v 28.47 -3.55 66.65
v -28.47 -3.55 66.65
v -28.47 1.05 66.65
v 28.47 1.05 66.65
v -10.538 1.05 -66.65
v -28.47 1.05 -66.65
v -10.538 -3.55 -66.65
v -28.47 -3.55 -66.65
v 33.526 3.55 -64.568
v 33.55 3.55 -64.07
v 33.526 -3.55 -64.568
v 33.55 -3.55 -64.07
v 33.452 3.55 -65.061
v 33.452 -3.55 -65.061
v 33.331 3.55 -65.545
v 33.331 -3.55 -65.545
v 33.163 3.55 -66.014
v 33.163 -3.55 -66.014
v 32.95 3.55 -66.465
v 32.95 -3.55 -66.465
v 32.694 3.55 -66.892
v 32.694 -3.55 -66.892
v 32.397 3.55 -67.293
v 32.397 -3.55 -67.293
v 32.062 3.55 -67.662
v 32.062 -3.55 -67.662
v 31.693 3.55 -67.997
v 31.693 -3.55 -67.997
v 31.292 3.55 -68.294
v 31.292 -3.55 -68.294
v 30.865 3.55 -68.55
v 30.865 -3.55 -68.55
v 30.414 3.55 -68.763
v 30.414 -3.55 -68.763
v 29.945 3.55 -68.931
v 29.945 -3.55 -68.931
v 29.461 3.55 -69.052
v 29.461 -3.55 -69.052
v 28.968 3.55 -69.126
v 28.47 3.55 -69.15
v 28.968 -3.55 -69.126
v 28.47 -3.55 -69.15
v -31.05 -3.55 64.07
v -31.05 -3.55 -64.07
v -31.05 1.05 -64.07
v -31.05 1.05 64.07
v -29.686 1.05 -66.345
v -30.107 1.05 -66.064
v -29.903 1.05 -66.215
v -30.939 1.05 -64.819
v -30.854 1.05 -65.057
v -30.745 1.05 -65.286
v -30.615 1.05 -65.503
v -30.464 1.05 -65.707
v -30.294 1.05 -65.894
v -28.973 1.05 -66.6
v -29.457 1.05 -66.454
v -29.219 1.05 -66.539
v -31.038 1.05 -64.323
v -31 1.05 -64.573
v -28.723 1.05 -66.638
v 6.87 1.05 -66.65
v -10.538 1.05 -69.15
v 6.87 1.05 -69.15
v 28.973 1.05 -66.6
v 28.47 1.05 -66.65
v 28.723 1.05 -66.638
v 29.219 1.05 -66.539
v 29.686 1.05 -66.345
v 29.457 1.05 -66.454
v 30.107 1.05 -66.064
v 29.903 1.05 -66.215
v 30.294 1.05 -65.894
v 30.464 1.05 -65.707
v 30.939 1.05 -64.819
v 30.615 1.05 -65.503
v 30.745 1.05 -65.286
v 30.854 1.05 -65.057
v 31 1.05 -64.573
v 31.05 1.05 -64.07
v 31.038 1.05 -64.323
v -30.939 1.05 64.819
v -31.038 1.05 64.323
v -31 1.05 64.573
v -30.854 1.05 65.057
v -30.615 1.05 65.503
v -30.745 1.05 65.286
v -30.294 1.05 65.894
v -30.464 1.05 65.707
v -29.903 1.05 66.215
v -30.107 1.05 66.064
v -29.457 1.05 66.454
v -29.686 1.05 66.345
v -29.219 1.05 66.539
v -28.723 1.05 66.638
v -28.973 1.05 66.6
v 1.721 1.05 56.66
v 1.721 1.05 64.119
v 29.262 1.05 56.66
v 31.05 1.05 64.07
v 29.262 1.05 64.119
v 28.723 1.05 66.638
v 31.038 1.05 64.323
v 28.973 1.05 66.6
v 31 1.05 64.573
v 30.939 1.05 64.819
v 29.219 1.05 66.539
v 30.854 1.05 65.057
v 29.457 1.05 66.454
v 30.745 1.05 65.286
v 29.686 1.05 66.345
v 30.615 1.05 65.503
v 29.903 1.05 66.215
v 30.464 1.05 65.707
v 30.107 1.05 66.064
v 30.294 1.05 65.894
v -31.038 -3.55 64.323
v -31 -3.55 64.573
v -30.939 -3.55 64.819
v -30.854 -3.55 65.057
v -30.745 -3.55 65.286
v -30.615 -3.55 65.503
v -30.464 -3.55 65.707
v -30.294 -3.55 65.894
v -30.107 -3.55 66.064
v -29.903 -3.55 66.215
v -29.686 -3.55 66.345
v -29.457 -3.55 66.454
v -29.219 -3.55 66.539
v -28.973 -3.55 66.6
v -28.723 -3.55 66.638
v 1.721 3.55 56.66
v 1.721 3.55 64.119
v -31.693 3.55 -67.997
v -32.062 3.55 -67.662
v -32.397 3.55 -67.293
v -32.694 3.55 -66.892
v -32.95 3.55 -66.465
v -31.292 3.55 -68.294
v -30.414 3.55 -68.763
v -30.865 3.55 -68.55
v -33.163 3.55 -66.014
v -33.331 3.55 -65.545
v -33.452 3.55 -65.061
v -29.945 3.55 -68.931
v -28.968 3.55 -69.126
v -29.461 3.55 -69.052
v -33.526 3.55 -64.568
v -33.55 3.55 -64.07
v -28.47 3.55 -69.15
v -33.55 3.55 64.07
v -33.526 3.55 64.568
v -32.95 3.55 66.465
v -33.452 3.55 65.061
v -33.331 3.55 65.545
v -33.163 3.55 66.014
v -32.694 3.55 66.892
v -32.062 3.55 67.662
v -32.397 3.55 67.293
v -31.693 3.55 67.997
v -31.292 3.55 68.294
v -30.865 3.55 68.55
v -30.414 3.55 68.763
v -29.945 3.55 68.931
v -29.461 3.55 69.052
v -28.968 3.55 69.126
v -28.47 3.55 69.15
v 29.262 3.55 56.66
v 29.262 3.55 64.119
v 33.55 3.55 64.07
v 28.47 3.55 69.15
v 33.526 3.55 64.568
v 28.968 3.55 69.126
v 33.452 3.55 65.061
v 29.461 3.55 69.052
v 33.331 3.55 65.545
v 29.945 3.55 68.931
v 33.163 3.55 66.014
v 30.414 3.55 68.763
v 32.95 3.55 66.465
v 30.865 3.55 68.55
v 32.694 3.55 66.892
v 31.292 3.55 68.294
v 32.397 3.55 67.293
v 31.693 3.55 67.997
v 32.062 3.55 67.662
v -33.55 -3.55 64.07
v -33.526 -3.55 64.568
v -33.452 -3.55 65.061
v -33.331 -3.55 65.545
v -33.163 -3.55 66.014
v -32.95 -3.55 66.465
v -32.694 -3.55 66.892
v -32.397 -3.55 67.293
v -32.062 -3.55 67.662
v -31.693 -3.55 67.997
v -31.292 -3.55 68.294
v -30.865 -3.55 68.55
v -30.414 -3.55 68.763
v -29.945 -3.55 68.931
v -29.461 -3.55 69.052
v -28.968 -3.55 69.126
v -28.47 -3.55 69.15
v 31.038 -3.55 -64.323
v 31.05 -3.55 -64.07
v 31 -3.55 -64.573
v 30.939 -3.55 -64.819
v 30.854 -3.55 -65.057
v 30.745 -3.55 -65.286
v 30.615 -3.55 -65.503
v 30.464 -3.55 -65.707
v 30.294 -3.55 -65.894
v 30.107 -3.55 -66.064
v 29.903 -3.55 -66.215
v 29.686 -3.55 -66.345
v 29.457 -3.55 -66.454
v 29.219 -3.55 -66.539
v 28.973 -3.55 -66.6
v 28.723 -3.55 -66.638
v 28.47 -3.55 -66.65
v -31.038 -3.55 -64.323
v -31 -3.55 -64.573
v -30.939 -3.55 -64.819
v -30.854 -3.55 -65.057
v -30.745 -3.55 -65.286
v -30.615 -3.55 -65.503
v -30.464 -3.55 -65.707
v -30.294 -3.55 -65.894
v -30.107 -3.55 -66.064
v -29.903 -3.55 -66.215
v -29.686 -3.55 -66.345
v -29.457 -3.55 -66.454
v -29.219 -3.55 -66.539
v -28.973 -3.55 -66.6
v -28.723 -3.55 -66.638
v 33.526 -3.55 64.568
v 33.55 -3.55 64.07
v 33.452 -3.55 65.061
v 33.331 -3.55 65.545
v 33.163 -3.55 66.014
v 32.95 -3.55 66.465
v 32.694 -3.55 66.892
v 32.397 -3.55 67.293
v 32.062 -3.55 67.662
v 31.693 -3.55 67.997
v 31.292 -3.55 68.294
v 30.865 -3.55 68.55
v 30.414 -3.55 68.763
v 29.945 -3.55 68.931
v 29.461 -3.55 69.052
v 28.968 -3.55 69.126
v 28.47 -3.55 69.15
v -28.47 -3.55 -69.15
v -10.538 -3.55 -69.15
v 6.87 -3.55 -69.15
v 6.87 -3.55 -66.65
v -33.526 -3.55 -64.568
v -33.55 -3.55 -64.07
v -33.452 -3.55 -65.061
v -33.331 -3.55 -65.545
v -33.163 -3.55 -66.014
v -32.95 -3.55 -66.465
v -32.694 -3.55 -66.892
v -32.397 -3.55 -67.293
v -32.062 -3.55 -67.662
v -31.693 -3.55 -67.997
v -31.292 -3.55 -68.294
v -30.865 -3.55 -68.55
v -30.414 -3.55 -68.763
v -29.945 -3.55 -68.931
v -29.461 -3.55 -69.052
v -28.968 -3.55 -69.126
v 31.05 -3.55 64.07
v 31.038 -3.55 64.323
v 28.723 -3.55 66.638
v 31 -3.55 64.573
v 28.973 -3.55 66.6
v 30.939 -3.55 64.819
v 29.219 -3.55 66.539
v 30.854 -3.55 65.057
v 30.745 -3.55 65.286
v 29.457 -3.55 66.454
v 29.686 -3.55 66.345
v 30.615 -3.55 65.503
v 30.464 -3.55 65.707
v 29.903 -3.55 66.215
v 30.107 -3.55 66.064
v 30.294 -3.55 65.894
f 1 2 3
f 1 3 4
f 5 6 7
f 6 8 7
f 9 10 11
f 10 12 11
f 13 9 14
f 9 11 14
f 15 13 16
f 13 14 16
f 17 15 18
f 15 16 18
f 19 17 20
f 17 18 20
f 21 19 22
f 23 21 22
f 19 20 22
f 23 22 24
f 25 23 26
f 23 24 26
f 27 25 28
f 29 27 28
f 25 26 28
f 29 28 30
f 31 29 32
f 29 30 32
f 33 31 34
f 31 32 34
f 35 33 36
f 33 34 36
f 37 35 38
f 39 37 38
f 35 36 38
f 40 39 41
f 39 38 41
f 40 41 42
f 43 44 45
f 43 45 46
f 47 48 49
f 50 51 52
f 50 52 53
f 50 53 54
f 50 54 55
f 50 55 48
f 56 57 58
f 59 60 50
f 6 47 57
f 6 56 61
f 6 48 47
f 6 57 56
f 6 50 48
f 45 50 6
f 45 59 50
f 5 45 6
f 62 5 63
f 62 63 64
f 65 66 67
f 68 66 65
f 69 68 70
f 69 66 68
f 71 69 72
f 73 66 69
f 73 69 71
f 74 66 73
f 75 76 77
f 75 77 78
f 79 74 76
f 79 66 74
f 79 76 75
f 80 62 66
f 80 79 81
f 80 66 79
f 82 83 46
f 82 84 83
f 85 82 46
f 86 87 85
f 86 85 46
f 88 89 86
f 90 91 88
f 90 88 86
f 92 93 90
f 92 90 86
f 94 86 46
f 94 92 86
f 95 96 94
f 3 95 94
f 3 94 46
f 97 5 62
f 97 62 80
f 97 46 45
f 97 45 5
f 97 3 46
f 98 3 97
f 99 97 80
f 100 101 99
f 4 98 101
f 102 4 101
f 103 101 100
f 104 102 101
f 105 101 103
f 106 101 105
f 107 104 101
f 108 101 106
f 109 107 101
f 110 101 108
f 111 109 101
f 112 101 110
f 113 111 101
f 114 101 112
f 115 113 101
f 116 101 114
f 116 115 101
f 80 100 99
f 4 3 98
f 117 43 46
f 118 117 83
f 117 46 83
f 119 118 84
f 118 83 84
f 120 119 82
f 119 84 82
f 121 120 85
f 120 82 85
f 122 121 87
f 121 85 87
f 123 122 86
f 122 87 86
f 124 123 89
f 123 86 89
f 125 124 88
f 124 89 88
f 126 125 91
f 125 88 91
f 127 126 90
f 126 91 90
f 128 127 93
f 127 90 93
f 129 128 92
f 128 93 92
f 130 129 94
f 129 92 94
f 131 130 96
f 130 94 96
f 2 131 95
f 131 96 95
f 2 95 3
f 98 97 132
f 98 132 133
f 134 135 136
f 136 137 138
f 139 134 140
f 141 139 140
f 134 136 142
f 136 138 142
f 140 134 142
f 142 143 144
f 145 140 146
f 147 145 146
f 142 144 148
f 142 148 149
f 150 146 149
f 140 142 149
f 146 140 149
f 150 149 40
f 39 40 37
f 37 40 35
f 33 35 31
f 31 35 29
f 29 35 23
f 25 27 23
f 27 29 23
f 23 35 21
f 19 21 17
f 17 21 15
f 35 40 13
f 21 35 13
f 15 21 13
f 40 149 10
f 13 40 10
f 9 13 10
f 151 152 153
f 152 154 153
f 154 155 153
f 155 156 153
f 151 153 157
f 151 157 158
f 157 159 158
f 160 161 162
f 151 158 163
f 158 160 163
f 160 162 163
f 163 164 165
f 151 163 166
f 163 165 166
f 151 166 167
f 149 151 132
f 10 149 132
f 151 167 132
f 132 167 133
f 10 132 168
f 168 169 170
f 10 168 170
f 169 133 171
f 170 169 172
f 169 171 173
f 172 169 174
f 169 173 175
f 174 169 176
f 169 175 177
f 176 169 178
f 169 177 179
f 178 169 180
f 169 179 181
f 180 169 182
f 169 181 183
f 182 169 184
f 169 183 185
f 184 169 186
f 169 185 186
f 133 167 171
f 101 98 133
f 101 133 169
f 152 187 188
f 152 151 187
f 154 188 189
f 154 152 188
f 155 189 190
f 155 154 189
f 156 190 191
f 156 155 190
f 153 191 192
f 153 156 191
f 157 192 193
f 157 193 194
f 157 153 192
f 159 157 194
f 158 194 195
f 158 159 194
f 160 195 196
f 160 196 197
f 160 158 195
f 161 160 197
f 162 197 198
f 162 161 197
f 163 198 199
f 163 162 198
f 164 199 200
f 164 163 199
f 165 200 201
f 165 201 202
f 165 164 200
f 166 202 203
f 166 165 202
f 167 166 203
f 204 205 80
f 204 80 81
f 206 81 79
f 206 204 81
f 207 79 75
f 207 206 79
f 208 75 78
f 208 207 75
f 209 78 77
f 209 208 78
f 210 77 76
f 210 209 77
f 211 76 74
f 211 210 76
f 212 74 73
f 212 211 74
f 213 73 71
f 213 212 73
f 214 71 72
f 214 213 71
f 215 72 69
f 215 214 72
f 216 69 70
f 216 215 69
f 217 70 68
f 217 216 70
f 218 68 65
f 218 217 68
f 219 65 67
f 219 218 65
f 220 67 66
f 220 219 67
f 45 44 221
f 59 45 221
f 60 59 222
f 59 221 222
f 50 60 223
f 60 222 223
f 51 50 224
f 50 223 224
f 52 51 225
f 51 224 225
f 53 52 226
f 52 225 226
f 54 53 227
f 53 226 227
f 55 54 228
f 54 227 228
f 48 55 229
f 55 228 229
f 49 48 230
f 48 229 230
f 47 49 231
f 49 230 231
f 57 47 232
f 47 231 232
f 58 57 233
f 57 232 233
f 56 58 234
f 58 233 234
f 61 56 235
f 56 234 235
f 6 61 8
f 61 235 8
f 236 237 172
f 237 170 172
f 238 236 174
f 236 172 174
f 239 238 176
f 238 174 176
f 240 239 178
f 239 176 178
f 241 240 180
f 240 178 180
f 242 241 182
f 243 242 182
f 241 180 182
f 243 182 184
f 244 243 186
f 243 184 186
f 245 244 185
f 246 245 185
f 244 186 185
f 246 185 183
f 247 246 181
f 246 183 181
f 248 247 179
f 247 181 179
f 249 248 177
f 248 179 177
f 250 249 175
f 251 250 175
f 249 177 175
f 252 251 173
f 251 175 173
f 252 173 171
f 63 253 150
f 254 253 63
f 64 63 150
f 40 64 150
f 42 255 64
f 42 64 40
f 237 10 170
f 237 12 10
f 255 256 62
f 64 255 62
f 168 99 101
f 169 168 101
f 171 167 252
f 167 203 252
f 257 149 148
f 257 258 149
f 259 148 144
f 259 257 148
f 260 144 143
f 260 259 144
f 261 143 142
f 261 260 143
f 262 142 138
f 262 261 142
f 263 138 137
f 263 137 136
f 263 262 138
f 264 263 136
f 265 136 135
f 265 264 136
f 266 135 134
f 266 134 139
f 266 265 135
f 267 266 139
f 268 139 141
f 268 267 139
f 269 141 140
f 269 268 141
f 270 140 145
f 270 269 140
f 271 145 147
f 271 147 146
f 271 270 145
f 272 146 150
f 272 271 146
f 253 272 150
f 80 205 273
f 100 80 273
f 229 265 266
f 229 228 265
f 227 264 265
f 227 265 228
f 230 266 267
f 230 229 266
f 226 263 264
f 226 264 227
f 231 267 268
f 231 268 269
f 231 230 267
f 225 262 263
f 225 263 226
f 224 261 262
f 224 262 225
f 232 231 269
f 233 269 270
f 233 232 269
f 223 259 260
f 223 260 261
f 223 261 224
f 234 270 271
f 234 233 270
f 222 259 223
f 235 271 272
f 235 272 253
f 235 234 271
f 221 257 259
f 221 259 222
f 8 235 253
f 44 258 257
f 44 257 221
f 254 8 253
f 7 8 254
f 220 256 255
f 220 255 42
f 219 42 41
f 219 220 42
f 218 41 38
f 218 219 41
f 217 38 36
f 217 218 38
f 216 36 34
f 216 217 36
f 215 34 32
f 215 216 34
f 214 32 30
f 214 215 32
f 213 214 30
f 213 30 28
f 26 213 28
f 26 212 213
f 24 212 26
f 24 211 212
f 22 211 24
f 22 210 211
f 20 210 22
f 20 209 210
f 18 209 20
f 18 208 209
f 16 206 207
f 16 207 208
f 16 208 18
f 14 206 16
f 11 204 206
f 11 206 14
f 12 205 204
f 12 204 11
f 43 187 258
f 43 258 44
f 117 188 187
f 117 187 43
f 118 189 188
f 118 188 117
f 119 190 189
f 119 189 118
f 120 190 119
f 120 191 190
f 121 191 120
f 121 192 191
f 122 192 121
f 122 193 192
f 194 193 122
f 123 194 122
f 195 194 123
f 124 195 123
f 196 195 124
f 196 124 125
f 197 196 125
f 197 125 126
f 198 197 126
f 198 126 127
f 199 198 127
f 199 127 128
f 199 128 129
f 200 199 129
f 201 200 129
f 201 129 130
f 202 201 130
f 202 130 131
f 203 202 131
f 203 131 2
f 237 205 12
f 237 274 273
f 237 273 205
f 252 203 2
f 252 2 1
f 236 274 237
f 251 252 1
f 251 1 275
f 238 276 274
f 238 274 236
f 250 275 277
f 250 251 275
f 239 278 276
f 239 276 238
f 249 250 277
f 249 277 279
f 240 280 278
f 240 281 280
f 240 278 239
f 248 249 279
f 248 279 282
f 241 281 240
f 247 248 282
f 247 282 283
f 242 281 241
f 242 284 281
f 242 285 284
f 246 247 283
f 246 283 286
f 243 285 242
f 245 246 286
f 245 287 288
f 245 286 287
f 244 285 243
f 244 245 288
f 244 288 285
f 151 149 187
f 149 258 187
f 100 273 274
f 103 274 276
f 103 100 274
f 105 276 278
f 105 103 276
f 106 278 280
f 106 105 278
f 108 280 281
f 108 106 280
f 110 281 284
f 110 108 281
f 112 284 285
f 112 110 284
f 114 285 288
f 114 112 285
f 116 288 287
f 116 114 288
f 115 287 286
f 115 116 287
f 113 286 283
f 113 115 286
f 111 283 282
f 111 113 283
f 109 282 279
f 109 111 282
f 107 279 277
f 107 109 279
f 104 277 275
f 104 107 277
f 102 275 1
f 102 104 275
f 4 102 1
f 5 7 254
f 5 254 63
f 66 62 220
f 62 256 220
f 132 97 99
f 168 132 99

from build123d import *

# Parameters (mm, degrees)
F0_W     = 67.1
F0_H     = 138.3
F1_DEPTH = 3.55
F2_R     = 5.08
F3_T     = -2.5
F4_W     = 27.54098
F4_H     = 7.459015
F5_DEPTH = 12.5
F6_W     = 17.408122
F6_H     = 4.6
F7_DEPTH = 25


with BuildPart() as f1:
    # F0 (on Front) → F1 (new body, symmetric)
    with BuildSketch(Plane.XZ):
        Rectangle(F0_W, F0_H)
    extrude(amount=F1_DEPTH, both=True)

    # F2
    f2_edges = [f1.edges().sort_by_distance(p)[0] for p in [
        (-33.55, 0, 69.15),
        (-33.55, 0, -69.15),
        (33.55, 0, -69.15),
        (33.55, 0, 69.15),
    ]]
    fillet(f2_edges, radius=F2_R)

    # F3
    f3_openings = [f1.faces().sort_by_distance(p)[0] for p in [
        (0, -3.55, 0),
    ]]
    offset(amount=F3_T, openings=f3_openings)

    # F4 (on Front) → F5 (cut, symmetric)
    with BuildSketch(Plane.XZ):
        with Locations((15.491805, 60.389347)):
            Rectangle(F4_W, F4_H)
    extrude(amount=F5_DEPTH, both=True, mode=Mode.SUBTRACT)

    # F6 (on face) → F7 (cut)
    with BuildSketch(Plane.XY.offset(-66.65)):
        with Locations((-1.833738, -1.25)):
            Rectangle(F6_W, F6_H)
    extrude(amount=-F7_DEPTH, mode=Mode.SUBTRACT)


solid = f1.part
